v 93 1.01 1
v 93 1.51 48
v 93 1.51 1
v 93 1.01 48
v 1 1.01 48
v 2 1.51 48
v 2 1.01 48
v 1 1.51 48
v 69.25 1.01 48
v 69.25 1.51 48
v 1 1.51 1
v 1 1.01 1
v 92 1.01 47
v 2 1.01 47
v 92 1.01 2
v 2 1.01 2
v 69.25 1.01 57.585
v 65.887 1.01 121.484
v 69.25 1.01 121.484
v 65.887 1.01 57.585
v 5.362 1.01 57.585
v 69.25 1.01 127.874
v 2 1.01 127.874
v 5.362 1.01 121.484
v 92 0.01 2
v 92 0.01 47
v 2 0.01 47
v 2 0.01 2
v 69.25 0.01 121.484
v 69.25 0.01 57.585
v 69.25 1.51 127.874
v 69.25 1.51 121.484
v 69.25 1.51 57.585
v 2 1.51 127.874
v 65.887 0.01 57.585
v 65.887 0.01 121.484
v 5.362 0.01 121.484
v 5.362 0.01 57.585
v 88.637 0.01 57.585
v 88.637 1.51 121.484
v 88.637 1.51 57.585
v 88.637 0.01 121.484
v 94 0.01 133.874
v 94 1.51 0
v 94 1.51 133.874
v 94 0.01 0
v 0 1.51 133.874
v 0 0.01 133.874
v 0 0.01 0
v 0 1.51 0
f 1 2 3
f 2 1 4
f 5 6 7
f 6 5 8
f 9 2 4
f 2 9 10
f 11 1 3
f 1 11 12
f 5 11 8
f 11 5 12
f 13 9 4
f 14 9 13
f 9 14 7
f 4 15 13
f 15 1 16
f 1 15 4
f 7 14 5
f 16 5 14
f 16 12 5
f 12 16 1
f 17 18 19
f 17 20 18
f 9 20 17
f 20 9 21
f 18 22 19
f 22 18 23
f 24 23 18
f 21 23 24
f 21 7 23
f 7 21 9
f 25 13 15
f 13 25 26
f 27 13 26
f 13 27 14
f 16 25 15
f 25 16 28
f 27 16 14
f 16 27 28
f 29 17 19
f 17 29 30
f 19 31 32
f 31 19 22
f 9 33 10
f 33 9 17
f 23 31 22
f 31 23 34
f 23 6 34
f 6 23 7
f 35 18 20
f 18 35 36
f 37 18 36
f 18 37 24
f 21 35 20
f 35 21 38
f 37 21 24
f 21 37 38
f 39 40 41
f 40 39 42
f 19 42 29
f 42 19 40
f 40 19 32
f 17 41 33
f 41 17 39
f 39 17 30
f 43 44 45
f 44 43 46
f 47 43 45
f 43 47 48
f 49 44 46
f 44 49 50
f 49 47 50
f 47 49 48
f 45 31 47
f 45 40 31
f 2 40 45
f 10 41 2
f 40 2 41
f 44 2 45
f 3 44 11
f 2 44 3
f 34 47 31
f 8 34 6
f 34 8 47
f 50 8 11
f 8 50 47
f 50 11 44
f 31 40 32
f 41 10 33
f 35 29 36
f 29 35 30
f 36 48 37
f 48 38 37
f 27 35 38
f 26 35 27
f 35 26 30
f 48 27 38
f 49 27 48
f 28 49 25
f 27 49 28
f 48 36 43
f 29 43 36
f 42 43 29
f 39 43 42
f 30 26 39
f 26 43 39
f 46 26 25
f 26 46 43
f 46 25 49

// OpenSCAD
// Teahaz Communicator v0
$fn = 10;
MODULE_MARGIN = 5;
MODULE_WIDTH = 90;
CASE_THICKNESS = 2;

KB_ROWS = 5;
KB_COLS = 12;
KB_HEIGHT = 40;
KB_DEPTH = 10;
KB_LIP = 1;
KB_LIP_DEPTH = 2;
KB_GAP = 1.8;

function _key_dim(dim, count) = (
    (dim - 2*MODULE_MARGIN - (count-1)*KB_GAP) / count
);

KB_KEY_WIDTH = _key_dim(MODULE_WIDTH, KB_COLS);
KB_KEY_HEIGHT = _key_dim(KB_HEIGHT, KB_ROWS);
KB_KEY_DEPTH = 8;

KB_MK_WIDTH = 7;
KB_MK_HEIGHT = 5;
KB_MK_COUNT = 6;

KB_MACRO_HEIGHT = KB_MK_HEIGHT + MODULE_MARGIN;
KB_MACRO_GAP = (
    (MODULE_WIDTH - 2*MODULE_MARGIN - KB_MK_COUNT*KB_MK_WIDTH)
    / (KB_MK_COUNT-1)
);

KB_H_TOTAL = KB_HEIGHT + KB_MK_HEIGHT;

SCR_WIDTH = 67.25;
SCR_HEIGHT = 79.874;
SCR_DEPTH = 0.7;

SCR_BEZEL_L = SCR_WIDTH * 0.05;
SCR_BEZEL_R = SCR_WIDTH * 0.05;
SCR_BEZEL_X = SCR_BEZEL_L + SCR_BEZEL_R;
SCR_BEZEL_T = SCR_HEIGHT * 0.08;
SCR_BEZEL_B = SCR_HEIGHT * 0.12;
SCR_BEZEL_Y = SCR_BEZEL_T + SCR_BEZEL_B;

SCR_H_TOTAL = SCR_HEIGHT;

CASE_HEIGHT = 2*CASE_THICKNESS+KB_H_TOTAL+SCR_H_TOTAL+MODULE_MARGIN;
CASE_WIDTH = MODULE_WIDTH+2*CASE_THICKNESS;
CASE_DEPTH = KB_DEPTH+CASE_THICKNESS;

FRONTPLATE_DEPTH = 1.5;

INDICATOR_MARGIN = 0;

module Keyboard(cutout=false) {
    lip_depth = cutout ? KB_LIP_DEPTH+1 : KB_LIP_DEPTH;
    color("red")
        translate([-KB_LIP, 1, -KB_LIP])
        cube([MODULE_WIDTH+KB_LIP*2, lip_depth, KB_H_TOTAL+KB_LIP*2]);
    
    color("blue")
        translate([0, cutout ? -1 : 0, 0])
        cube([MODULE_WIDTH, lip_depth, KB_HEIGHT+KB_MK_HEIGHT]);

    if (!cutout) {
        color("blue")
            translate([0, KB_LIP_DEPTH, 0])
            cube([MODULE_WIDTH, KB_DEPTH-KB_LIP_DEPTH, KB_HEIGHT+KB_MK_HEIGHT]);
        
        color("darkgray")
            translate([MODULE_MARGIN, KB_LIP_DEPTH, MODULE_MARGIN])
            for (row = [0:KB_ROWS-1]) {
                for (col = [0:KB_COLS-1]) {
                    translate([
                        col*(KB_GAP+KB_KEY_WIDTH),
                        -KB_KEY_DEPTH,
                        row*(KB_GAP+KB_KEY_HEIGHT),
                    ])
                        if (row == 0 && 3 < col && col < 8) {
                            if (col == 4) cube([
                                (KB_KEY_WIDTH+KB_GAP) * 4 - KB_GAP,
                                KB_KEY_DEPTH,
                                KB_KEY_HEIGHT
                            ]);
                        } else {
                            cube([KB_KEY_WIDTH, KB_KEY_DEPTH, KB_KEY_HEIGHT]);
                        }
                }
            }
        
        color("darkgray")
            translate([MODULE_MARGIN, KB_LIP_DEPTH, MODULE_MARGIN])
            for (col = [0:KB_MK_COUNT-1]) {
                translate([
                    col*(KB_MACRO_GAP+KB_MK_WIDTH),
                    -KB_KEY_DEPTH,
                    KB_HEIGHT-MODULE_MARGIN*1.5
                ])
                    cube([KB_MK_WIDTH, KB_KEY_DEPTH, KB_MK_HEIGHT]);
            }
    }
    
}

module Screen(cutout=false) {
    // https://aliexpress.com/item/1005007579014355.html
    // https://aliexpress.com/item/1005006168560918.html
    translate([0, 1, 0]) {
        difference() {
            color("gray") cube([SCR_WIDTH, SCR_DEPTH, SCR_HEIGHT]);
            if (!cutout) {
                translate([SCR_BEZEL_L, -1, SCR_BEZEL_B])
                    color("black")
                    cube([SCR_WIDTH-SCR_BEZEL_X, 2, SCR_HEIGHT-SCR_BEZEL_Y]);
            }
        }
    }

    if (cutout) {
        translate([SCR_BEZEL_L, -1, SCR_BEZEL_B])
            cube([SCR_WIDTH-SCR_BEZEL_X, 3, SCR_HEIGHT-SCR_BEZEL_Y]);
    }
}

module Indicators() {
    width = MODULE_WIDTH - SCR_WIDTH - INDICATOR_MARGIN - SCR_BEZEL_L;
    height = SCR_HEIGHT - SCR_BEZEL_Y;
    echo(width, height);
    
    count = 10;
    cols = 5;
    y_gap = height / count;
    x_gap = width / cols;
    
    difference() {
        color("black") cube([width, 5, height]);
        *for (x = [0:cols-1]) {
            translate([x_gap/2 + x*x_gap, 2, y_gap/2]) {
                rotate([90, 0, 0]) {
                    for (y = [0:count-1]) {
                        translate([0, y_gap * y, 0]) cylinder(10, 1);
                    }
                }
            }
        }    
    }
}

module Case() {
    translate([0, FRONTPLATE_DEPTH, 0]) {
        cube([CASE_WIDTH, CASE_DEPTH-FRONTPLATE_DEPTH, CASE_HEIGHT]);
    }
    children();
}

module Frontplate() {
    difference() {
        cube([
            MODULE_WIDTH+2*CASE_THICKNESS,
            FRONTPLATE_DEPTH,
            2*CASE_THICKNESS+KB_H_TOTAL+SCR_H_TOTAL+MODULE_MARGIN
        ]);
        translate([CASE_THICKNESS, 0, CASE_THICKNESS]) {
            Keyboard(cutout=true);
            translate([0, 0, KB_H_TOTAL+KB_LIP]) {
                Screen(cutout=true);
                translate ([SCR_WIDTH + INDICATOR_MARGIN, -1, SCR_BEZEL_B])
                    Indicators();
            }
        }
    }
}

union() {
    *Case() translate([CASE_THICKNESS, 0, CASE_THICKNESS]) {
        Keyboard();
        translate([0, 0, KB_H_TOTAL+KB_LIP]) {
            Screen();
            translate ([SCR_WIDTH + INDICATOR_MARGIN, 0, SCR_BEZEL_B])
                Indicators();
        }
    }
    translate([0, 0.01, 0]) Frontplate();
}
